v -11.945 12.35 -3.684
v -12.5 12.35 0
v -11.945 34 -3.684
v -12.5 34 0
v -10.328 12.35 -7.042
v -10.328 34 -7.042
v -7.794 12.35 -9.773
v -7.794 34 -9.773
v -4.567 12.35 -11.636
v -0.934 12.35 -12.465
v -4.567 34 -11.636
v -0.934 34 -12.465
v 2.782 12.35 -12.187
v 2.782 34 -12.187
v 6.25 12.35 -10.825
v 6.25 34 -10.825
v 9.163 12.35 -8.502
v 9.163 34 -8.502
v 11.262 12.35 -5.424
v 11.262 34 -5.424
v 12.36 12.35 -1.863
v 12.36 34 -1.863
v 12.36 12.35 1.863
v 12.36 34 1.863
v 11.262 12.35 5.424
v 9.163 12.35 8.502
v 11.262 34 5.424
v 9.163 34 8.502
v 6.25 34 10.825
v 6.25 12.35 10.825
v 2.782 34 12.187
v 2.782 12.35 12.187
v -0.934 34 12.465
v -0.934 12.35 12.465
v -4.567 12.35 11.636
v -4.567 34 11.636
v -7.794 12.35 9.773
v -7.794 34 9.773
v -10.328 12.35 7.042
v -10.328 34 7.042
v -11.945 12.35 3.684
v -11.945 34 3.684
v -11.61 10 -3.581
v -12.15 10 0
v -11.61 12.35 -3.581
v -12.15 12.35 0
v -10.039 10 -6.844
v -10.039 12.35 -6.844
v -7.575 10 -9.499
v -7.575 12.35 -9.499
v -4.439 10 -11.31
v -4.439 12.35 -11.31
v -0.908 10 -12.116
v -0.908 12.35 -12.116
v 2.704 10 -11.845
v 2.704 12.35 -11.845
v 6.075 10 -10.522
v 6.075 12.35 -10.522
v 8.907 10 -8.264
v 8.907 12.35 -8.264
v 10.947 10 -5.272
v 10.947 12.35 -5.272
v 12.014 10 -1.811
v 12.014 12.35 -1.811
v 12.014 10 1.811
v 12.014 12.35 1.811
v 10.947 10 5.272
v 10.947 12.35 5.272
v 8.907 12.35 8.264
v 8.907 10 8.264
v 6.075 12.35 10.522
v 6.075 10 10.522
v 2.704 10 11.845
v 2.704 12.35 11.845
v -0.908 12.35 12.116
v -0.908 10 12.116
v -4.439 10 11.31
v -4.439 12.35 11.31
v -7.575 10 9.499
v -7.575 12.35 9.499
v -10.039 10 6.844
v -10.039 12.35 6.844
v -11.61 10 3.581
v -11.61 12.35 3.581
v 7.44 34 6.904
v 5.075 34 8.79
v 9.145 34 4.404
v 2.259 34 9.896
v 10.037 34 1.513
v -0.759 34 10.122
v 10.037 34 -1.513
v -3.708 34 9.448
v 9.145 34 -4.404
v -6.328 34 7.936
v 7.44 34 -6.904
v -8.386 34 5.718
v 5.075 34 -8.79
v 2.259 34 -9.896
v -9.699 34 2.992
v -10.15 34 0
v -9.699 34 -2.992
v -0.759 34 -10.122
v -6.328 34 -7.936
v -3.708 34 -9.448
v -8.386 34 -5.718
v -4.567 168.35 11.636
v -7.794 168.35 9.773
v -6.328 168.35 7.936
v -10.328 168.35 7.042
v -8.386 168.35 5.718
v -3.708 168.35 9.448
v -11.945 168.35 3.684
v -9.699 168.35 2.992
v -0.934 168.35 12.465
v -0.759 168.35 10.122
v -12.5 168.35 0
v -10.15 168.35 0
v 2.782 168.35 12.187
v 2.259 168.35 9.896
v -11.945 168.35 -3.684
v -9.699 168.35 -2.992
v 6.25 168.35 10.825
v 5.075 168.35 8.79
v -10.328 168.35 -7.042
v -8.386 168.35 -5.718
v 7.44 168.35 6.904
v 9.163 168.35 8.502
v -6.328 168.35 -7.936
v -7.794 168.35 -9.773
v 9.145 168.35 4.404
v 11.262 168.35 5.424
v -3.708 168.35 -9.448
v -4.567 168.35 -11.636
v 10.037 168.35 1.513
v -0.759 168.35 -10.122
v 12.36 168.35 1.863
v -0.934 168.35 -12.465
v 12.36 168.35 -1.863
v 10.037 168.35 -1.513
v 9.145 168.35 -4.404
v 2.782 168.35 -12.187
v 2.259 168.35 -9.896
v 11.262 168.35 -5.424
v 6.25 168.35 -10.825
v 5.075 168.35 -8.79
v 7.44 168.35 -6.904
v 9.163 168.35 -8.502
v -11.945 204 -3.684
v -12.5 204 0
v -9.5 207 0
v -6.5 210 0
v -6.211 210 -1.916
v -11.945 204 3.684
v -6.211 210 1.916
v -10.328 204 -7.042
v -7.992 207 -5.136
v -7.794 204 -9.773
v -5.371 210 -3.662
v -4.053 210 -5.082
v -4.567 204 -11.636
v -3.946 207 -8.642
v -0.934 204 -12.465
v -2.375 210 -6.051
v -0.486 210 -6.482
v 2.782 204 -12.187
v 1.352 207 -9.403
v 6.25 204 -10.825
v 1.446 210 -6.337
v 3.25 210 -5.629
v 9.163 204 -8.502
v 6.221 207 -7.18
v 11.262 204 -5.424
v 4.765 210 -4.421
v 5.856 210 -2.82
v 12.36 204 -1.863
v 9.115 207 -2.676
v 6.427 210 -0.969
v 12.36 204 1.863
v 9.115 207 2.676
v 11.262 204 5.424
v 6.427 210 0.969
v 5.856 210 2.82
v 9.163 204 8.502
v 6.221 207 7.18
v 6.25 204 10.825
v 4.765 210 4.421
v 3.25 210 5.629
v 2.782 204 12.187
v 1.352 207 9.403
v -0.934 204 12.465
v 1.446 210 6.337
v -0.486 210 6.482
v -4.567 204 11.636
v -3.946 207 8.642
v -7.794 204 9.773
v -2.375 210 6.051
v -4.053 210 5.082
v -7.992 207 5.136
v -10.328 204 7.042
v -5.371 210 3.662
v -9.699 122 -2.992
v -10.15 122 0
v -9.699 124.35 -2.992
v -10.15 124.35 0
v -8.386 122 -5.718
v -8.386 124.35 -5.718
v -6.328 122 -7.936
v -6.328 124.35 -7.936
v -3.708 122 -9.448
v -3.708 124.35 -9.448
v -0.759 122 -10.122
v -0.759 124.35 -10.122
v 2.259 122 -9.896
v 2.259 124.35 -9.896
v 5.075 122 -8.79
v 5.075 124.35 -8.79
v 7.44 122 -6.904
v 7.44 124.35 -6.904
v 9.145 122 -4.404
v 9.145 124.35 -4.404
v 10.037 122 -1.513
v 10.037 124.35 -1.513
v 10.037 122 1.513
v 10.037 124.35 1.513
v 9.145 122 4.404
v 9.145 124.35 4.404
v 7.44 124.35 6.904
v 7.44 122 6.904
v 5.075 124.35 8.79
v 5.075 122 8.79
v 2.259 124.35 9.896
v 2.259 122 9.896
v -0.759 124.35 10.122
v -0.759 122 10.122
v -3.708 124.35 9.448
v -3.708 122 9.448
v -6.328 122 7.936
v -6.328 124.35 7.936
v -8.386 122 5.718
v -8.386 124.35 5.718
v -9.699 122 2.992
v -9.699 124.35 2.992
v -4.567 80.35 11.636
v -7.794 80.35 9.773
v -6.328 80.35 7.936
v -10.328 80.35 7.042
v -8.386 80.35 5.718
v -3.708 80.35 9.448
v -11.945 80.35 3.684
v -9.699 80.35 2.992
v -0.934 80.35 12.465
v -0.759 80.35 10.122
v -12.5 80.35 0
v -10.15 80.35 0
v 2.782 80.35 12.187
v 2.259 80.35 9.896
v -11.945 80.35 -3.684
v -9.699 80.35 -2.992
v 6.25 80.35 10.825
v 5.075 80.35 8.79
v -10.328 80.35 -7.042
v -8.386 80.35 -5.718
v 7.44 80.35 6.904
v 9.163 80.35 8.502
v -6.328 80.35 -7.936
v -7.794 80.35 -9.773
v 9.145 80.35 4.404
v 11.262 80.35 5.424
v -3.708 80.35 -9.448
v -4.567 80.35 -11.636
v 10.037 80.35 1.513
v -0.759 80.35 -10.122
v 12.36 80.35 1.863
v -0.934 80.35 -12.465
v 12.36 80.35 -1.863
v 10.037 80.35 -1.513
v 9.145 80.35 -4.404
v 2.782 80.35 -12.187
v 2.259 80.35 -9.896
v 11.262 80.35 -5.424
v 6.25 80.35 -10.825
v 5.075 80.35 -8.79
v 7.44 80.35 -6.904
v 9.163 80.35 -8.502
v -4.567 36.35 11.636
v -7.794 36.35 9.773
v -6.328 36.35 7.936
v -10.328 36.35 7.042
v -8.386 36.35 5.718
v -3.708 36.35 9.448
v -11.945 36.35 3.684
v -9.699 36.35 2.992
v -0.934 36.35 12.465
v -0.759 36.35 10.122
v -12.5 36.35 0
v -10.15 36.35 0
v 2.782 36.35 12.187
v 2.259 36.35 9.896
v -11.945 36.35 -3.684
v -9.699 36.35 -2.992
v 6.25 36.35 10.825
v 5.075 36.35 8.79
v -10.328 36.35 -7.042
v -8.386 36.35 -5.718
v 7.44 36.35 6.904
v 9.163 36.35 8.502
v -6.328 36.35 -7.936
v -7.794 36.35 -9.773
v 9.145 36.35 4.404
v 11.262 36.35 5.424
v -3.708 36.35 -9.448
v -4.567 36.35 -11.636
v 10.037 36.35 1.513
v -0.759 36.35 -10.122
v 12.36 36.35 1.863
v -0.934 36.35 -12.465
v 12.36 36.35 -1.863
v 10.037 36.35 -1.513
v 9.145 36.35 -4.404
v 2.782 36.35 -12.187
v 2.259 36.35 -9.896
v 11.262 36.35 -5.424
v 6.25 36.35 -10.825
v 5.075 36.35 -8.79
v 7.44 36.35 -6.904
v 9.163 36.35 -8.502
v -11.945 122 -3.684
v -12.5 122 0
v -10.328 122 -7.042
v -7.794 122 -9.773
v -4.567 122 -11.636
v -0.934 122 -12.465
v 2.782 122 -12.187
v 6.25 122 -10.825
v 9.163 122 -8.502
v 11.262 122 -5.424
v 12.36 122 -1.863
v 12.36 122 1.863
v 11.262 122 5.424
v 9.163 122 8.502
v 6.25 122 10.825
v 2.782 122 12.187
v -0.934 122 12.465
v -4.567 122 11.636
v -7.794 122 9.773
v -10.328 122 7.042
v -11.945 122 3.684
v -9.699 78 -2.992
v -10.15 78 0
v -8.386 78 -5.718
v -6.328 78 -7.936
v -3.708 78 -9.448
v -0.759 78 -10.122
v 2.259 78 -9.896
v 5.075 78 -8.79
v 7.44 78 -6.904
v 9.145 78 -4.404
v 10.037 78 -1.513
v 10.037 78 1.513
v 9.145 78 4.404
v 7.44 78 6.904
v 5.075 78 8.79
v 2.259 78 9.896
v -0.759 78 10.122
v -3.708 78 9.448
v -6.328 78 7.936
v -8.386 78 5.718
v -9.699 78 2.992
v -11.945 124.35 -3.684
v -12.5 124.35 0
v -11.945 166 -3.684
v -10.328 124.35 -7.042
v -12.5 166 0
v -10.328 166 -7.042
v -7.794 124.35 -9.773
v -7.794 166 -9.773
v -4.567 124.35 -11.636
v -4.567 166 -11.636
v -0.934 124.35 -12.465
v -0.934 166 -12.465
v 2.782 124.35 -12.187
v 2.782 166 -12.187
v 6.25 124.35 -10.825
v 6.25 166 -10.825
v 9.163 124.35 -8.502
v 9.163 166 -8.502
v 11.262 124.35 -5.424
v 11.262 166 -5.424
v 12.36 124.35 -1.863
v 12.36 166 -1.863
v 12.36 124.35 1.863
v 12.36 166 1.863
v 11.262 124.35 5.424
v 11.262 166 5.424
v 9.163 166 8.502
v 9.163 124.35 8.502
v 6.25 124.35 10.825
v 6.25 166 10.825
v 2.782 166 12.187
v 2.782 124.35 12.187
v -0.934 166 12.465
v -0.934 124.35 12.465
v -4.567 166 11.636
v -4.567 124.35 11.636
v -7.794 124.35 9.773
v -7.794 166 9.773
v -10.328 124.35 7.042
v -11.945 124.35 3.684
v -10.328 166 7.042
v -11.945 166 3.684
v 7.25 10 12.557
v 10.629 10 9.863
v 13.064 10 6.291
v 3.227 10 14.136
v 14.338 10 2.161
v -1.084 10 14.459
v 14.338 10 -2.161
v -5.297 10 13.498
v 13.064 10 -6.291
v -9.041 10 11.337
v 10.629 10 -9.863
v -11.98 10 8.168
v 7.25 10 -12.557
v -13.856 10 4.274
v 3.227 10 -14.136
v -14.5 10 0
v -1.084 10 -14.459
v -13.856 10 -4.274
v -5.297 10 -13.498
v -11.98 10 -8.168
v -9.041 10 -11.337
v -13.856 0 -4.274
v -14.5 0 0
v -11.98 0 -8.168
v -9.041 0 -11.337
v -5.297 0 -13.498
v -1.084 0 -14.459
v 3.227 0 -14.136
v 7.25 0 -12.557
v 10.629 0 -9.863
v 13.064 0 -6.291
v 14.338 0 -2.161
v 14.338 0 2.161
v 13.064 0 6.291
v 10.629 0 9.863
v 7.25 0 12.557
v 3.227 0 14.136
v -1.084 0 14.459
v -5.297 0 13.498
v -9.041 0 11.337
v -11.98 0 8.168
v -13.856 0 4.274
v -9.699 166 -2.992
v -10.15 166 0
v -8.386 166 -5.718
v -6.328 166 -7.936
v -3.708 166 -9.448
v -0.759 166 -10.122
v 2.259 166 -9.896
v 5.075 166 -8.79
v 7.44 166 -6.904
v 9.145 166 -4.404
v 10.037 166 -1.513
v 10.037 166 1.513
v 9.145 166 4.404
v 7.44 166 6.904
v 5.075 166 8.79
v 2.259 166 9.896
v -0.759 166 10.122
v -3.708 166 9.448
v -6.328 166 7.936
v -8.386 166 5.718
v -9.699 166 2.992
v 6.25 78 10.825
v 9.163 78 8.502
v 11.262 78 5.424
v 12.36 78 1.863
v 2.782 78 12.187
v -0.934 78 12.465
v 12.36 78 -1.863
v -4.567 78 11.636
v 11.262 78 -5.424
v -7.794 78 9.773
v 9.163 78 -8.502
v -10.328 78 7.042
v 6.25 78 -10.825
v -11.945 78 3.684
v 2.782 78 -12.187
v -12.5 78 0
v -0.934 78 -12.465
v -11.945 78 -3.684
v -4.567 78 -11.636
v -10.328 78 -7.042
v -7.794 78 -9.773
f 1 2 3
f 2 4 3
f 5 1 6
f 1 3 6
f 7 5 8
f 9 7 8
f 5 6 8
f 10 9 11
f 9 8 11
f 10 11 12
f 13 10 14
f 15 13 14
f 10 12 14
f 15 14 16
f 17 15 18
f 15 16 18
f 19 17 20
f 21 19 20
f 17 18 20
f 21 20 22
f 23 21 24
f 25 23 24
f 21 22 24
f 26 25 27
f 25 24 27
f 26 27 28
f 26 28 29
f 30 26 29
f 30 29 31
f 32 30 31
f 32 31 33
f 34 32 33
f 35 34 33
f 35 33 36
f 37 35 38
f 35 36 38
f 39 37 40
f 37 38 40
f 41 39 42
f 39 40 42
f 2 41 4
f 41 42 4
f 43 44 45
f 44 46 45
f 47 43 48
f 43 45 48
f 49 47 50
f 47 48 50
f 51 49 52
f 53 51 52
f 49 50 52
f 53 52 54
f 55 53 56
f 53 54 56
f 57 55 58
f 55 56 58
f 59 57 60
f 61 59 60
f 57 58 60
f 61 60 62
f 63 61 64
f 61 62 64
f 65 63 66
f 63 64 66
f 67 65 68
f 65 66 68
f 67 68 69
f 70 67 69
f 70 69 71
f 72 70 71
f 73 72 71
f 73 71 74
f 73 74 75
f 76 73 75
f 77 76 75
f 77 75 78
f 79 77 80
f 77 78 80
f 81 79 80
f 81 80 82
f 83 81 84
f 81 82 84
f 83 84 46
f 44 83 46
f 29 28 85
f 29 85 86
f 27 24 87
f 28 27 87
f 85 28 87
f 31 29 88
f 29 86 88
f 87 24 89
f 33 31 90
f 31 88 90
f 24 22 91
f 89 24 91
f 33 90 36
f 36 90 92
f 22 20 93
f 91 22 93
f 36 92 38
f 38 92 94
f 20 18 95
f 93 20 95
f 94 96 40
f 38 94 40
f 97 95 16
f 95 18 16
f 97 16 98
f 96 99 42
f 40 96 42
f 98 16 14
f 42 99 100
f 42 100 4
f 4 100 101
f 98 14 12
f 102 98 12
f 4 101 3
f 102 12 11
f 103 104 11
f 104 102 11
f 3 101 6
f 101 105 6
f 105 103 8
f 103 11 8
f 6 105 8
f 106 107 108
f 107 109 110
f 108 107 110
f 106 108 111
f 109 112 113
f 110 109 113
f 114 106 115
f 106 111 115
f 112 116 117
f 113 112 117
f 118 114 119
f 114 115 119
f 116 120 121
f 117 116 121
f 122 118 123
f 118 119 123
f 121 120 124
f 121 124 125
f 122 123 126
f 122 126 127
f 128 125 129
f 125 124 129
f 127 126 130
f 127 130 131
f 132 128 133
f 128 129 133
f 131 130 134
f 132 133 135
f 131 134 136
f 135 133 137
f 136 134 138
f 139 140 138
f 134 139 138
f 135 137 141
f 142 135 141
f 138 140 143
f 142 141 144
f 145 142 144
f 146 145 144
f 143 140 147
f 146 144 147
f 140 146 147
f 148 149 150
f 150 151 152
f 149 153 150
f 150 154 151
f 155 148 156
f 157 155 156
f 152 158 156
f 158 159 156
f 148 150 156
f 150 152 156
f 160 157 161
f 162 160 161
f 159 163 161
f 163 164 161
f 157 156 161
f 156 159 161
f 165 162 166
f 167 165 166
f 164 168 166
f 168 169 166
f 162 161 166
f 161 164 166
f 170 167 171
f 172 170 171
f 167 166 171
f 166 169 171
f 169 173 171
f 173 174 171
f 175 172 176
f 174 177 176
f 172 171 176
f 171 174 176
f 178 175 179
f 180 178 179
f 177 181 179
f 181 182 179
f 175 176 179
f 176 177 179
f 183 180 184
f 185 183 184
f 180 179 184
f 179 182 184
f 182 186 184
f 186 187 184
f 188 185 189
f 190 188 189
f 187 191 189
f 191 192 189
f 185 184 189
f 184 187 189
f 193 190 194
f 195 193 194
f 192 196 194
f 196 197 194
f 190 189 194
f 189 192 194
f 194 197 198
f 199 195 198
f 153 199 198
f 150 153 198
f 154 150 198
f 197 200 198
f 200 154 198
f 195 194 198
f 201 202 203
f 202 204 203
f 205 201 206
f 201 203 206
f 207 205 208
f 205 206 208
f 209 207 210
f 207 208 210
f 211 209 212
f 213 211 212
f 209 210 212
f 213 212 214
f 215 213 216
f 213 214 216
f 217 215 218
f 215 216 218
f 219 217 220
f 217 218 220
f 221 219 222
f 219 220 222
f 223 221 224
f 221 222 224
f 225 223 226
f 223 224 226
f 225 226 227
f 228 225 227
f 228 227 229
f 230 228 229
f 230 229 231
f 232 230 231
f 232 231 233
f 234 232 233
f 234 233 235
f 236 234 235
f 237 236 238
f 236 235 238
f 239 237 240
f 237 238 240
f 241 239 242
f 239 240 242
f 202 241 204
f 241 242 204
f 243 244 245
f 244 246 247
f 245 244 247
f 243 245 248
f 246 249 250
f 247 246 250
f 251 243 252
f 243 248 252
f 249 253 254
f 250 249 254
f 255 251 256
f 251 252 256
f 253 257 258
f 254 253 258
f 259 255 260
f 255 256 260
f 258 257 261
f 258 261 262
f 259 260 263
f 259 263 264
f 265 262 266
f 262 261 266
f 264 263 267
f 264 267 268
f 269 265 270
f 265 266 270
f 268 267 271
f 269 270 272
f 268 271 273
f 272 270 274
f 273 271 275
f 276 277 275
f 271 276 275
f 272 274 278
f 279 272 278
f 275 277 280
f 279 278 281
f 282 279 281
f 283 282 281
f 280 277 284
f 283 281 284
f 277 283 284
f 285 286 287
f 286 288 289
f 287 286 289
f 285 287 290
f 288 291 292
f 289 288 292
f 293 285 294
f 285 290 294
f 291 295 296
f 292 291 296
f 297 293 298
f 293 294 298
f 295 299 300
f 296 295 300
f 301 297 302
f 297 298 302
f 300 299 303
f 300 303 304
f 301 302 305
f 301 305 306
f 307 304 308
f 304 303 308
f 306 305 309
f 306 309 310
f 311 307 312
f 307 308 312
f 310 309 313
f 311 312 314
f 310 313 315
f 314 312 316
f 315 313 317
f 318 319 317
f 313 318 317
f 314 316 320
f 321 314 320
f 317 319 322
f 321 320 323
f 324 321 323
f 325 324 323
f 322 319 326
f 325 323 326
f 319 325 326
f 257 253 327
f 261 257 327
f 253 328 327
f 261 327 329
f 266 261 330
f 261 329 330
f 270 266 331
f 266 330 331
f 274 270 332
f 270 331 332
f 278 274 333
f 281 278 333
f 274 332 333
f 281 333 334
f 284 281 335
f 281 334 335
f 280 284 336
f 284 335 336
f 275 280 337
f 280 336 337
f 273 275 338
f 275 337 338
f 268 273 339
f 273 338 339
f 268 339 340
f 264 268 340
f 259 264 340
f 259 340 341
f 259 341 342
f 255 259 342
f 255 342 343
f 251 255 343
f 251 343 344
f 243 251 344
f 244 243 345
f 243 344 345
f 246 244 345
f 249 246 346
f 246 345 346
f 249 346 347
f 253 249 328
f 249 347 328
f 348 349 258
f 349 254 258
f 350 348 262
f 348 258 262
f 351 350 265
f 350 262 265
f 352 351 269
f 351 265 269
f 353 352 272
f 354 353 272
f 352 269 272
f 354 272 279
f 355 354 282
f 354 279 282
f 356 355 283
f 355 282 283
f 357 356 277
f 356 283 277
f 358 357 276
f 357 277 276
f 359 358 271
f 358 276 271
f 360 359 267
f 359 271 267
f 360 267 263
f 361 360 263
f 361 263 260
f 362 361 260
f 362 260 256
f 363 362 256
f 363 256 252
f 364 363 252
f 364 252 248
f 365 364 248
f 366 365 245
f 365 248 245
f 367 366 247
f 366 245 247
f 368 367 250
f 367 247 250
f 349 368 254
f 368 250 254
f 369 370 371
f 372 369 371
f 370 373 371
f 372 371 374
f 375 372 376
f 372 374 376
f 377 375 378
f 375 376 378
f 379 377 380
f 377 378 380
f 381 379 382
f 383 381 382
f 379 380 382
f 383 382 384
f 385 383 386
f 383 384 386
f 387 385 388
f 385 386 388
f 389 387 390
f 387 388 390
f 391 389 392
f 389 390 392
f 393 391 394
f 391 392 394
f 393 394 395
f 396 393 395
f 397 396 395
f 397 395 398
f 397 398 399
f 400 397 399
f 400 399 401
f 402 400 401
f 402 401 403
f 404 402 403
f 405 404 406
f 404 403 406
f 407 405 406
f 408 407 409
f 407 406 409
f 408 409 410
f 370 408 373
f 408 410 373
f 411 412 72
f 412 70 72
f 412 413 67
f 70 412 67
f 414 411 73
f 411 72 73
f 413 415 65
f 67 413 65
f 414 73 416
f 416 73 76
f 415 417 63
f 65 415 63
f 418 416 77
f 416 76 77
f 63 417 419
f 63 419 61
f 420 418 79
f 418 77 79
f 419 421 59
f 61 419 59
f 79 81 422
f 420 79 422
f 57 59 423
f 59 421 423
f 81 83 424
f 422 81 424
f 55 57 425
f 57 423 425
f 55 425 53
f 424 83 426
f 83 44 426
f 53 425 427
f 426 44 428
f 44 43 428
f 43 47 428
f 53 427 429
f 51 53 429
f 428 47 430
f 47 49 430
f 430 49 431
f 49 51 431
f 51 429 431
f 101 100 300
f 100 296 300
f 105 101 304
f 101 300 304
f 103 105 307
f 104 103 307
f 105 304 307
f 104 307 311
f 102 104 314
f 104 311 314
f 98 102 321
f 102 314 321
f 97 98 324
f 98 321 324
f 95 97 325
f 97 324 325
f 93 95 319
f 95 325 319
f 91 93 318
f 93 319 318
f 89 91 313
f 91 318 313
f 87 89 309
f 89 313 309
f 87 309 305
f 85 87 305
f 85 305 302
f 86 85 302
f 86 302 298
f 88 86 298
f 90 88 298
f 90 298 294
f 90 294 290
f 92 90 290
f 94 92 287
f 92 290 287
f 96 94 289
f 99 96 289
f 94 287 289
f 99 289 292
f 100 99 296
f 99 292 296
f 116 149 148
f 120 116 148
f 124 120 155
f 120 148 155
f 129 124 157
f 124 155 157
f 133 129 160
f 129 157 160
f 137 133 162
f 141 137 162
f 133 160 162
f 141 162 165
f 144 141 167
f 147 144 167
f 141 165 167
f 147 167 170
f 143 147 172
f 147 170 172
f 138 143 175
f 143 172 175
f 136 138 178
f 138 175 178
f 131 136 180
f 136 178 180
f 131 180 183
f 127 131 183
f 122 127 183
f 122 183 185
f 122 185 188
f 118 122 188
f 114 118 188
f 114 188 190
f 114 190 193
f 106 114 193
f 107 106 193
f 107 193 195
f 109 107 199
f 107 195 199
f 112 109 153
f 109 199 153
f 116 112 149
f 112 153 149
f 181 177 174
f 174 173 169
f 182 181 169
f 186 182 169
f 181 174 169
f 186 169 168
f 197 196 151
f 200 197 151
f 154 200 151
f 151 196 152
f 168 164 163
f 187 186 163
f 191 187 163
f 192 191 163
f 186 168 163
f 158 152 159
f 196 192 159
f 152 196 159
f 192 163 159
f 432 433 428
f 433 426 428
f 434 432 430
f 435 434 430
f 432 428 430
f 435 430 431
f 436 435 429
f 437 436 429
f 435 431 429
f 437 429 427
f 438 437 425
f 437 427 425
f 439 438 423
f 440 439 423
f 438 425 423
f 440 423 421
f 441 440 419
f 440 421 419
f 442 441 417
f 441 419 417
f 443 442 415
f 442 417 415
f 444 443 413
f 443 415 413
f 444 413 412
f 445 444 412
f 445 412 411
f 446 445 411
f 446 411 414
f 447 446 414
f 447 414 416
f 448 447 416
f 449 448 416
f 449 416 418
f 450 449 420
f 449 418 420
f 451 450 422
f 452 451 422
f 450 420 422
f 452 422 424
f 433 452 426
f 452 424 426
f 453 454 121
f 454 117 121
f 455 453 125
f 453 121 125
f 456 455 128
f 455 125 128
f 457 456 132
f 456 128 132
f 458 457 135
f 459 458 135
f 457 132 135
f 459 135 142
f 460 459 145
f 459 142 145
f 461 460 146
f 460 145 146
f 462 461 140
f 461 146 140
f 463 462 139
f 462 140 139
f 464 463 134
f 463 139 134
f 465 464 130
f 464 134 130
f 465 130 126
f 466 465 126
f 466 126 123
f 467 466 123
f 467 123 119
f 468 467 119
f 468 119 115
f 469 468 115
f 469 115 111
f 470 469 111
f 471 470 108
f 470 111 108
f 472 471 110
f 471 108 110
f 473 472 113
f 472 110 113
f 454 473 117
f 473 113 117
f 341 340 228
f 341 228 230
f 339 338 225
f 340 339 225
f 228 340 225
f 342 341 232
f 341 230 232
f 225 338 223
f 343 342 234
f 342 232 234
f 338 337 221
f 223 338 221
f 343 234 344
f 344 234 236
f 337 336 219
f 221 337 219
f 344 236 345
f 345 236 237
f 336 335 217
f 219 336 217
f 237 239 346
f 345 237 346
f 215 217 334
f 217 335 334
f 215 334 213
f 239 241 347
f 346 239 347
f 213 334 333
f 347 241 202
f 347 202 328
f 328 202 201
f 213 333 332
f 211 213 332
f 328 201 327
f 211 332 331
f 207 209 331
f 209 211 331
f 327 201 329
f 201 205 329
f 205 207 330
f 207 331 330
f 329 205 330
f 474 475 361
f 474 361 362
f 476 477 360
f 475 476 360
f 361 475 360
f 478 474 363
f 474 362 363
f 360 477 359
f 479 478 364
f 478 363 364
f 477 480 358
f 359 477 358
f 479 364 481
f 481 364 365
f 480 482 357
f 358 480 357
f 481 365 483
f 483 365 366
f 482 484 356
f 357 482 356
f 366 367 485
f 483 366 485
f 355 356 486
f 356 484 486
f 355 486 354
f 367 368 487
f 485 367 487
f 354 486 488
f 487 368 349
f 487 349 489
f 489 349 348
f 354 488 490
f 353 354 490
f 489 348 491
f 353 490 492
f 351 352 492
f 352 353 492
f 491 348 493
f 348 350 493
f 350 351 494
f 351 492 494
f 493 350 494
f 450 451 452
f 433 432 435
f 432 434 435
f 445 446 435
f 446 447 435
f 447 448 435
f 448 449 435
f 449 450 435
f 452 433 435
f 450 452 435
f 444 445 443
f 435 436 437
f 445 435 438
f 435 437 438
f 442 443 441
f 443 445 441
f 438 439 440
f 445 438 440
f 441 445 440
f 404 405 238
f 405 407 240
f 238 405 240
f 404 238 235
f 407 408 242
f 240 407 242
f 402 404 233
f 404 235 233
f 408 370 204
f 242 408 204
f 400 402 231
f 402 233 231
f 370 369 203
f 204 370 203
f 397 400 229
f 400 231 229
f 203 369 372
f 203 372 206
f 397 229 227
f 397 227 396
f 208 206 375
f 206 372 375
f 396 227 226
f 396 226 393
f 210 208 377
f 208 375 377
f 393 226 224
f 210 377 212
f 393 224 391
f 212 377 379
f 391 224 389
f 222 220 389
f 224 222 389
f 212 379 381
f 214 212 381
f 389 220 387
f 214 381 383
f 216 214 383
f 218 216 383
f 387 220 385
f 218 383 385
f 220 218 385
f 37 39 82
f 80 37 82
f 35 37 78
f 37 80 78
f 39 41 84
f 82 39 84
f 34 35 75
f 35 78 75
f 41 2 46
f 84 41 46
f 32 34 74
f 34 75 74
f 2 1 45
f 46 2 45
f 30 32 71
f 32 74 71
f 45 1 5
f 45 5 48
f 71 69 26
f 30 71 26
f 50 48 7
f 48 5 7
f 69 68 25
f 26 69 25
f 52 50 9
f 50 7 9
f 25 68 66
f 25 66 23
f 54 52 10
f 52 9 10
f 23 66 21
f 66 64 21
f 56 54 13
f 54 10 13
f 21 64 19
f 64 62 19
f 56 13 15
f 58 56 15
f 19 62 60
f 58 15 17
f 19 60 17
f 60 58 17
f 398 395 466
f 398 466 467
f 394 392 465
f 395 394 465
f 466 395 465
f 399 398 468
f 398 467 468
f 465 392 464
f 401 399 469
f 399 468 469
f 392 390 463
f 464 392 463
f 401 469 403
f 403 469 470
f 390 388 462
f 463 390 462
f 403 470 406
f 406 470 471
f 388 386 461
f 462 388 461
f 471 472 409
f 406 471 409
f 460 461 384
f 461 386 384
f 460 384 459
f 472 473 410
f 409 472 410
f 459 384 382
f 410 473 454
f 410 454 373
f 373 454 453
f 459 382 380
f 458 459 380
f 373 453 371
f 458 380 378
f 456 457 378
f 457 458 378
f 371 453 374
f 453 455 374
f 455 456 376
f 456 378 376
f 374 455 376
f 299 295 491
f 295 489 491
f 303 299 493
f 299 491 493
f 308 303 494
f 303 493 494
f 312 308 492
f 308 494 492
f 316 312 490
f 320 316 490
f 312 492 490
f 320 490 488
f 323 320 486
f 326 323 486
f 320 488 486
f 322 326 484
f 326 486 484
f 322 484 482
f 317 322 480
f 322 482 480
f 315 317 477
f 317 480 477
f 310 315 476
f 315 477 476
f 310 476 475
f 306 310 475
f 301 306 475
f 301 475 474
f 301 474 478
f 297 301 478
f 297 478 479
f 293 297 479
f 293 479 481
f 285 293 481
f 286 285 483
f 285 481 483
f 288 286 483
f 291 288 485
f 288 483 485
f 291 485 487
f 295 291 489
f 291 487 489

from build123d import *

# Parameters (mm, degrees)
CHAMFER1_SIZE = 6


with BuildPart() as part:
    # Sketch1 → Revolve1 (revolve)
    with BuildSketch(Plane.XY, mode=Mode.PRIVATE) as revolve1_sk:
        Polygon((0, 0), (14.5, 0), (14.5, 10), (12.15, 10), (12.15, 12.35), (12.5, 12.35), (12.5, 34), (10.15, 34), (10.15, 36.35), (12.5, 36.35), (12.5, 78), (10.15, 78), (10.15, 80.35), (12.5, 80.35), (12.5, 122), (10.15, 122), (10.15, 124.35), (12.5, 124.35), (12.5, 166), (10.15, 166), (10.15, 168.35), (12.5, 168.35), (12.5, 210), (0, 210), align=None)
    revolve(revolve1_sk.sketch.rotate(Axis((0, 210, 0), (0, -1, 0)), 180), axis=Axis((0, 210, 0), (0, -1, 0)))

    # Chamfer1
    chamfer1_edges = [part.edges().sort_by_distance(p)[0] for p in [
        (12.5, 210, 0),
    ]]
    chamfer(chamfer1_edges, length=CHAMFER1_SIZE)


solid = part.part
